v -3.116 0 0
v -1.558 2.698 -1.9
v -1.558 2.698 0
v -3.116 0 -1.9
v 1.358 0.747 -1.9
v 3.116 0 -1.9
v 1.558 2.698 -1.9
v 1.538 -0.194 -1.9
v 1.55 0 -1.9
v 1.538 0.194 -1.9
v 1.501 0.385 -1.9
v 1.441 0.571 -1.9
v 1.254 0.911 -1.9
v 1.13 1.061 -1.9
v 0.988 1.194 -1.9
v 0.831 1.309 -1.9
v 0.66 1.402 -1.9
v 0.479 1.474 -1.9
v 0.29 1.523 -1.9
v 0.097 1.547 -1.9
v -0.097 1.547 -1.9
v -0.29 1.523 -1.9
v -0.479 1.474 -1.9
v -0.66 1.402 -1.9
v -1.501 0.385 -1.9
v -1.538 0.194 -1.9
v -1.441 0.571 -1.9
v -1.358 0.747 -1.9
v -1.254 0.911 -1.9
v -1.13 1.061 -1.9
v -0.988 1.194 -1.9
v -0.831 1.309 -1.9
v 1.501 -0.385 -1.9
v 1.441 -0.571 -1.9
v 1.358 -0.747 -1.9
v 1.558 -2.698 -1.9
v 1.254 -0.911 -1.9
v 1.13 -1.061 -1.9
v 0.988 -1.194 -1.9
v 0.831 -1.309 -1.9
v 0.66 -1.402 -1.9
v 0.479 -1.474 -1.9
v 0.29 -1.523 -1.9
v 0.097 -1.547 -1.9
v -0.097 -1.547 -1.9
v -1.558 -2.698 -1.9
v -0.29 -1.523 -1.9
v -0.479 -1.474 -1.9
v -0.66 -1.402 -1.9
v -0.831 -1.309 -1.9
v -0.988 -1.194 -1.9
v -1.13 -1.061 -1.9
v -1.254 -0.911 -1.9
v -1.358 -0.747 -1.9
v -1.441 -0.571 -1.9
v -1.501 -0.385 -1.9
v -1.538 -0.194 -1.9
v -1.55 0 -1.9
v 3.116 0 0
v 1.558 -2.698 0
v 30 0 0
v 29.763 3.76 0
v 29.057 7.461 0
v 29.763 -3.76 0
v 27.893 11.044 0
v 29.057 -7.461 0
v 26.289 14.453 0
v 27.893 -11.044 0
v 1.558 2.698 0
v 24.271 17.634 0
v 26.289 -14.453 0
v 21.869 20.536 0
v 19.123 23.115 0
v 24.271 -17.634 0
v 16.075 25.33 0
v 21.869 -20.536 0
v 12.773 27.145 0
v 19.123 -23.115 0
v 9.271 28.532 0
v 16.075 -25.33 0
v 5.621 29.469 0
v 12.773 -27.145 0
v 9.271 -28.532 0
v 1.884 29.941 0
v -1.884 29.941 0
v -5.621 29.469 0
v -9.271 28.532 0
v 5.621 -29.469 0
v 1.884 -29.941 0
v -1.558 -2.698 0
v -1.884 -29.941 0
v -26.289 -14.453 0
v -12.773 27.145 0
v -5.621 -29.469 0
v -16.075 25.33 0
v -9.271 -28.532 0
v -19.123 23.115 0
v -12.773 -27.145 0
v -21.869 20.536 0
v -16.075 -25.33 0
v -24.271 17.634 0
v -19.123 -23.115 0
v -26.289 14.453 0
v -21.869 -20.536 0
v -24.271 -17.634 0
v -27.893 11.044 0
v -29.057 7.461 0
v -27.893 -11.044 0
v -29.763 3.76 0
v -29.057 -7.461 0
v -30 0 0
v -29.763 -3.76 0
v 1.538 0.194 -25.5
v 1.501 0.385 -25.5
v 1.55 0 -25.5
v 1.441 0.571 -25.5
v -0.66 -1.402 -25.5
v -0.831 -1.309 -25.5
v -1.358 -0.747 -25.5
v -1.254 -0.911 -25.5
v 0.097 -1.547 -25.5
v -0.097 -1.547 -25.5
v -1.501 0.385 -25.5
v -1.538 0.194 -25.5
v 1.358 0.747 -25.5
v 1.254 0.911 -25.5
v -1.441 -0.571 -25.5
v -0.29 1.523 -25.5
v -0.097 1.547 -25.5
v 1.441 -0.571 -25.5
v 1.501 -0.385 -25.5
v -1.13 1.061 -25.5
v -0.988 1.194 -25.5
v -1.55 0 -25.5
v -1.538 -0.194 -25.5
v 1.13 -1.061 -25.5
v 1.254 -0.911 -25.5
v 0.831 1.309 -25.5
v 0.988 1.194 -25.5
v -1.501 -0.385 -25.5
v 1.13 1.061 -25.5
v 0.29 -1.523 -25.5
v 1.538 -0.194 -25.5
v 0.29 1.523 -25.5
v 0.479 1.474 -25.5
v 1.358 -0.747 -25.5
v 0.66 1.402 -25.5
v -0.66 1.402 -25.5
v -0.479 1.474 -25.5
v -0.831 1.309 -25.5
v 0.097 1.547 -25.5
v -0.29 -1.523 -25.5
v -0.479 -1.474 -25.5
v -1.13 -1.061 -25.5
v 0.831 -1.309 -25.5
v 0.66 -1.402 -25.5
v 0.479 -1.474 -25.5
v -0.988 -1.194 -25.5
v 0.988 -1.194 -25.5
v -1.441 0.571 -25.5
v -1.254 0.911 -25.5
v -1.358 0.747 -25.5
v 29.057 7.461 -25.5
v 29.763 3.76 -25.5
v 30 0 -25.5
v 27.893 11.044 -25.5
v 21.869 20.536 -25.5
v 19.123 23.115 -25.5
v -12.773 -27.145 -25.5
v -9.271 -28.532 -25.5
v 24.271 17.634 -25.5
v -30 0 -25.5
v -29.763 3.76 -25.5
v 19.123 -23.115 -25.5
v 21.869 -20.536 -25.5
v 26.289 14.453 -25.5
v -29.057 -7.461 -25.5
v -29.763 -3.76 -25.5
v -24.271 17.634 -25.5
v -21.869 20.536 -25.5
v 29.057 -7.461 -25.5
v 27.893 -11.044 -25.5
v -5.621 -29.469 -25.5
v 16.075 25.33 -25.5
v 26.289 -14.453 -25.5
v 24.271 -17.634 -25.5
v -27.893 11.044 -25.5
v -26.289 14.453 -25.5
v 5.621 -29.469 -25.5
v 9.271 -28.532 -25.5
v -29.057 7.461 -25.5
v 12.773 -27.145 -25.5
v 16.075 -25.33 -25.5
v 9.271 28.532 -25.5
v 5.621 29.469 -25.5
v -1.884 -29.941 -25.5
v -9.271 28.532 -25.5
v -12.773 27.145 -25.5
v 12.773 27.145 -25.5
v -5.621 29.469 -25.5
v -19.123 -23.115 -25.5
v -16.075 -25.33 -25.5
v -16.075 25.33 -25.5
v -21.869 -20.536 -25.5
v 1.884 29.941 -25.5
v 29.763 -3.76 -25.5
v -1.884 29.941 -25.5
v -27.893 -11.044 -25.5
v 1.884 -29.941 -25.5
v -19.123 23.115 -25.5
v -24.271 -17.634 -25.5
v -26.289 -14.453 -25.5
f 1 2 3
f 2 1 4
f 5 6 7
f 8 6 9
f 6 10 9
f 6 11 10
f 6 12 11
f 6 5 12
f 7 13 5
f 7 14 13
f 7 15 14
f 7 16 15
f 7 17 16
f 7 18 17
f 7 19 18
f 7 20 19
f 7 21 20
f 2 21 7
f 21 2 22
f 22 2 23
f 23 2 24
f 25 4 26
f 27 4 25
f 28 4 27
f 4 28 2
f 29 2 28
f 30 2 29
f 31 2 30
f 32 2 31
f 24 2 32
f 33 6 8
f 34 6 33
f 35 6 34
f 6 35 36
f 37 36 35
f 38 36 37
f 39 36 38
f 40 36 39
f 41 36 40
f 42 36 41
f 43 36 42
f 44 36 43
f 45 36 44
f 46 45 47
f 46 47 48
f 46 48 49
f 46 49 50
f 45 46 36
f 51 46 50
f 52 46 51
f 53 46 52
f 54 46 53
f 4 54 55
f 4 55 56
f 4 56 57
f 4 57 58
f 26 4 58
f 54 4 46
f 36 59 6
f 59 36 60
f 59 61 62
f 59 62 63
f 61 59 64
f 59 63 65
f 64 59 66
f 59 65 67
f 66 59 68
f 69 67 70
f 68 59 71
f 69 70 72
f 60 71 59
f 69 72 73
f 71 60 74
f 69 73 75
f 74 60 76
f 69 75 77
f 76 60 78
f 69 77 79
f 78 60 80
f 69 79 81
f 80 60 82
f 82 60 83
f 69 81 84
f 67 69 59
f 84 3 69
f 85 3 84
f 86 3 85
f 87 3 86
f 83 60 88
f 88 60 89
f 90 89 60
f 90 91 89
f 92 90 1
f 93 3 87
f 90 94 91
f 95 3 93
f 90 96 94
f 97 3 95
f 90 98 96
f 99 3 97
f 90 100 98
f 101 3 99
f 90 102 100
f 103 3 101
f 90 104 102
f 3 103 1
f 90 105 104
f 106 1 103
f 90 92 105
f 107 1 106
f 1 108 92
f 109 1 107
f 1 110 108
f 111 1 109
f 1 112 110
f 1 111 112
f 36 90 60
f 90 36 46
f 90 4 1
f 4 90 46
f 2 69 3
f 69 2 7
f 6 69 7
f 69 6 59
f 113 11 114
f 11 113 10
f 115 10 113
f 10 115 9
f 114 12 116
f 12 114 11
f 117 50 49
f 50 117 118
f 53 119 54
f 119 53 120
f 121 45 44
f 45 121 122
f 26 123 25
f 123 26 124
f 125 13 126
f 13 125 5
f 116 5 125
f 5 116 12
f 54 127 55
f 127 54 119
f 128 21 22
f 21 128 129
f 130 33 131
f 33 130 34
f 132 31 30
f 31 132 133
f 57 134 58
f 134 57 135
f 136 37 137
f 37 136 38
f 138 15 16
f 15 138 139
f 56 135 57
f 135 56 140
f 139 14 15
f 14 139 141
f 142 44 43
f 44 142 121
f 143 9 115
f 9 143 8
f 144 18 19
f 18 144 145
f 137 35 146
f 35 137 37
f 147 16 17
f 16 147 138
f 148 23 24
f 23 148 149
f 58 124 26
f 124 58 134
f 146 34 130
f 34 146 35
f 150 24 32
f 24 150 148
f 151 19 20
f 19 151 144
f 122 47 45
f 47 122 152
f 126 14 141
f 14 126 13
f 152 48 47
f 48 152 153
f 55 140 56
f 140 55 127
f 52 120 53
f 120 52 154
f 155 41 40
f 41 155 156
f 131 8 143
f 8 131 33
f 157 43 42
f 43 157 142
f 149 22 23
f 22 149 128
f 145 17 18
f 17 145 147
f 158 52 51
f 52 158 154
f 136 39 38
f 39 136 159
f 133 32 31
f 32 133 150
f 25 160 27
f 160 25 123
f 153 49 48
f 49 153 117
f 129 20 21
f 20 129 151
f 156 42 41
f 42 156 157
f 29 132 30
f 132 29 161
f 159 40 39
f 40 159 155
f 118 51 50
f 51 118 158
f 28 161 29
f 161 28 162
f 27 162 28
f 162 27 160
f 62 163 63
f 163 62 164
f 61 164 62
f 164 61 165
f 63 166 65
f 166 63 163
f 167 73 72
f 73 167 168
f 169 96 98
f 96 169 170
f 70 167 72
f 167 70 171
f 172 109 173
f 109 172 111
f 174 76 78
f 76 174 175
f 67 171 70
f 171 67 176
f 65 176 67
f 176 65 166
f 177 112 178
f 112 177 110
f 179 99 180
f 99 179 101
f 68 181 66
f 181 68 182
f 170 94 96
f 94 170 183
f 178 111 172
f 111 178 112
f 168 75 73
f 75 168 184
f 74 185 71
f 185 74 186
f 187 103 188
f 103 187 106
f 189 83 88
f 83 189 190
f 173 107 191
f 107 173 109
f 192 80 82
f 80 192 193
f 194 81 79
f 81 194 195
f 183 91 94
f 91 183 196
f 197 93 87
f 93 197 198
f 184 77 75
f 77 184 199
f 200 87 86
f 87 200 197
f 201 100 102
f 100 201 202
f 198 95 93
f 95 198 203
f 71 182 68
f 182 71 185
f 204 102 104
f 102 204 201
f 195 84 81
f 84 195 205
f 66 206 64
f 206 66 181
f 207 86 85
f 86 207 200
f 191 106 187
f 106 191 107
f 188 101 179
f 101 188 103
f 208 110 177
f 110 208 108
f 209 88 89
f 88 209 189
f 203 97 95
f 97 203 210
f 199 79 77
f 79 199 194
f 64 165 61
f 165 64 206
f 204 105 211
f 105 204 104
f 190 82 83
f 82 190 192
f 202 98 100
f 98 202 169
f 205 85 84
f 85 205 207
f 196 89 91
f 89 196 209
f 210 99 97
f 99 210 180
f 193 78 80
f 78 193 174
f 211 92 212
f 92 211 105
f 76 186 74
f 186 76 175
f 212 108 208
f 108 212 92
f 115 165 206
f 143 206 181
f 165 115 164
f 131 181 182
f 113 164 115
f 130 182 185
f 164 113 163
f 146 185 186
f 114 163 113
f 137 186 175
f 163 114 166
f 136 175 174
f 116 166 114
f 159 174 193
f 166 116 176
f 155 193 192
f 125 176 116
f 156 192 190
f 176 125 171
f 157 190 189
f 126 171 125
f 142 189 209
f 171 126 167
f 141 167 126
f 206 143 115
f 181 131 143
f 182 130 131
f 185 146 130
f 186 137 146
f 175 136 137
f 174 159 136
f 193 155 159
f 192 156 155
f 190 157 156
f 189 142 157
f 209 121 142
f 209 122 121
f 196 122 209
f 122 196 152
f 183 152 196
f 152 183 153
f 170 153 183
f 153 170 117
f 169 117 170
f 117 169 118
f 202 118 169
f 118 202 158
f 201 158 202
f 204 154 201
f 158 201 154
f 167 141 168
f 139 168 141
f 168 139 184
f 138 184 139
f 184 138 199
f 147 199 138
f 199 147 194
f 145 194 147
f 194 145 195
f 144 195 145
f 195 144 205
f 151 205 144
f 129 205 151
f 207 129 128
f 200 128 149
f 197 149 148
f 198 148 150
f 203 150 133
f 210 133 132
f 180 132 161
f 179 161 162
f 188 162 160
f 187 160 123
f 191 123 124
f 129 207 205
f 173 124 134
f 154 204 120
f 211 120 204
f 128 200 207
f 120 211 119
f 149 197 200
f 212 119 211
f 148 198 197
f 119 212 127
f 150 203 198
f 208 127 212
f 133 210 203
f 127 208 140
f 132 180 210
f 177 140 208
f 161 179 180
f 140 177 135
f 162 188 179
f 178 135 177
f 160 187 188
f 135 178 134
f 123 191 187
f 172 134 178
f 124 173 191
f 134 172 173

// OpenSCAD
$fn = 50;

difference() {
	union() {
		translate(v = [0, 0, -25.5]) {
			cylinder(h = 25.5, r = 30.0);
		}
	}
	union() {
		translate(v = [0, 0, 0]) {
			rotate(a = [0, 0, 0]) {
				difference() {
					union() {
						translate(v = [0, 0, -1.9]) {
							linear_extrude(height = 1.9) {
								polygon(points = [[3.1158, 0.0], [1.5579000000000005, 2.698361953111554], [-1.5578999999999994, 2.6983619531115544], [-3.1158, 3.815754496783323e-16], [-1.5579000000000014, -2.6983619531115535], [1.557899999999998, -2.6983619531115552]]);
							}
						}
					}
					union();
				}
			}
		}
		#translate(v = [0, 0, -100.0]) {
			cylinder(h = 200, r = 1.55);
		}
	}
}
